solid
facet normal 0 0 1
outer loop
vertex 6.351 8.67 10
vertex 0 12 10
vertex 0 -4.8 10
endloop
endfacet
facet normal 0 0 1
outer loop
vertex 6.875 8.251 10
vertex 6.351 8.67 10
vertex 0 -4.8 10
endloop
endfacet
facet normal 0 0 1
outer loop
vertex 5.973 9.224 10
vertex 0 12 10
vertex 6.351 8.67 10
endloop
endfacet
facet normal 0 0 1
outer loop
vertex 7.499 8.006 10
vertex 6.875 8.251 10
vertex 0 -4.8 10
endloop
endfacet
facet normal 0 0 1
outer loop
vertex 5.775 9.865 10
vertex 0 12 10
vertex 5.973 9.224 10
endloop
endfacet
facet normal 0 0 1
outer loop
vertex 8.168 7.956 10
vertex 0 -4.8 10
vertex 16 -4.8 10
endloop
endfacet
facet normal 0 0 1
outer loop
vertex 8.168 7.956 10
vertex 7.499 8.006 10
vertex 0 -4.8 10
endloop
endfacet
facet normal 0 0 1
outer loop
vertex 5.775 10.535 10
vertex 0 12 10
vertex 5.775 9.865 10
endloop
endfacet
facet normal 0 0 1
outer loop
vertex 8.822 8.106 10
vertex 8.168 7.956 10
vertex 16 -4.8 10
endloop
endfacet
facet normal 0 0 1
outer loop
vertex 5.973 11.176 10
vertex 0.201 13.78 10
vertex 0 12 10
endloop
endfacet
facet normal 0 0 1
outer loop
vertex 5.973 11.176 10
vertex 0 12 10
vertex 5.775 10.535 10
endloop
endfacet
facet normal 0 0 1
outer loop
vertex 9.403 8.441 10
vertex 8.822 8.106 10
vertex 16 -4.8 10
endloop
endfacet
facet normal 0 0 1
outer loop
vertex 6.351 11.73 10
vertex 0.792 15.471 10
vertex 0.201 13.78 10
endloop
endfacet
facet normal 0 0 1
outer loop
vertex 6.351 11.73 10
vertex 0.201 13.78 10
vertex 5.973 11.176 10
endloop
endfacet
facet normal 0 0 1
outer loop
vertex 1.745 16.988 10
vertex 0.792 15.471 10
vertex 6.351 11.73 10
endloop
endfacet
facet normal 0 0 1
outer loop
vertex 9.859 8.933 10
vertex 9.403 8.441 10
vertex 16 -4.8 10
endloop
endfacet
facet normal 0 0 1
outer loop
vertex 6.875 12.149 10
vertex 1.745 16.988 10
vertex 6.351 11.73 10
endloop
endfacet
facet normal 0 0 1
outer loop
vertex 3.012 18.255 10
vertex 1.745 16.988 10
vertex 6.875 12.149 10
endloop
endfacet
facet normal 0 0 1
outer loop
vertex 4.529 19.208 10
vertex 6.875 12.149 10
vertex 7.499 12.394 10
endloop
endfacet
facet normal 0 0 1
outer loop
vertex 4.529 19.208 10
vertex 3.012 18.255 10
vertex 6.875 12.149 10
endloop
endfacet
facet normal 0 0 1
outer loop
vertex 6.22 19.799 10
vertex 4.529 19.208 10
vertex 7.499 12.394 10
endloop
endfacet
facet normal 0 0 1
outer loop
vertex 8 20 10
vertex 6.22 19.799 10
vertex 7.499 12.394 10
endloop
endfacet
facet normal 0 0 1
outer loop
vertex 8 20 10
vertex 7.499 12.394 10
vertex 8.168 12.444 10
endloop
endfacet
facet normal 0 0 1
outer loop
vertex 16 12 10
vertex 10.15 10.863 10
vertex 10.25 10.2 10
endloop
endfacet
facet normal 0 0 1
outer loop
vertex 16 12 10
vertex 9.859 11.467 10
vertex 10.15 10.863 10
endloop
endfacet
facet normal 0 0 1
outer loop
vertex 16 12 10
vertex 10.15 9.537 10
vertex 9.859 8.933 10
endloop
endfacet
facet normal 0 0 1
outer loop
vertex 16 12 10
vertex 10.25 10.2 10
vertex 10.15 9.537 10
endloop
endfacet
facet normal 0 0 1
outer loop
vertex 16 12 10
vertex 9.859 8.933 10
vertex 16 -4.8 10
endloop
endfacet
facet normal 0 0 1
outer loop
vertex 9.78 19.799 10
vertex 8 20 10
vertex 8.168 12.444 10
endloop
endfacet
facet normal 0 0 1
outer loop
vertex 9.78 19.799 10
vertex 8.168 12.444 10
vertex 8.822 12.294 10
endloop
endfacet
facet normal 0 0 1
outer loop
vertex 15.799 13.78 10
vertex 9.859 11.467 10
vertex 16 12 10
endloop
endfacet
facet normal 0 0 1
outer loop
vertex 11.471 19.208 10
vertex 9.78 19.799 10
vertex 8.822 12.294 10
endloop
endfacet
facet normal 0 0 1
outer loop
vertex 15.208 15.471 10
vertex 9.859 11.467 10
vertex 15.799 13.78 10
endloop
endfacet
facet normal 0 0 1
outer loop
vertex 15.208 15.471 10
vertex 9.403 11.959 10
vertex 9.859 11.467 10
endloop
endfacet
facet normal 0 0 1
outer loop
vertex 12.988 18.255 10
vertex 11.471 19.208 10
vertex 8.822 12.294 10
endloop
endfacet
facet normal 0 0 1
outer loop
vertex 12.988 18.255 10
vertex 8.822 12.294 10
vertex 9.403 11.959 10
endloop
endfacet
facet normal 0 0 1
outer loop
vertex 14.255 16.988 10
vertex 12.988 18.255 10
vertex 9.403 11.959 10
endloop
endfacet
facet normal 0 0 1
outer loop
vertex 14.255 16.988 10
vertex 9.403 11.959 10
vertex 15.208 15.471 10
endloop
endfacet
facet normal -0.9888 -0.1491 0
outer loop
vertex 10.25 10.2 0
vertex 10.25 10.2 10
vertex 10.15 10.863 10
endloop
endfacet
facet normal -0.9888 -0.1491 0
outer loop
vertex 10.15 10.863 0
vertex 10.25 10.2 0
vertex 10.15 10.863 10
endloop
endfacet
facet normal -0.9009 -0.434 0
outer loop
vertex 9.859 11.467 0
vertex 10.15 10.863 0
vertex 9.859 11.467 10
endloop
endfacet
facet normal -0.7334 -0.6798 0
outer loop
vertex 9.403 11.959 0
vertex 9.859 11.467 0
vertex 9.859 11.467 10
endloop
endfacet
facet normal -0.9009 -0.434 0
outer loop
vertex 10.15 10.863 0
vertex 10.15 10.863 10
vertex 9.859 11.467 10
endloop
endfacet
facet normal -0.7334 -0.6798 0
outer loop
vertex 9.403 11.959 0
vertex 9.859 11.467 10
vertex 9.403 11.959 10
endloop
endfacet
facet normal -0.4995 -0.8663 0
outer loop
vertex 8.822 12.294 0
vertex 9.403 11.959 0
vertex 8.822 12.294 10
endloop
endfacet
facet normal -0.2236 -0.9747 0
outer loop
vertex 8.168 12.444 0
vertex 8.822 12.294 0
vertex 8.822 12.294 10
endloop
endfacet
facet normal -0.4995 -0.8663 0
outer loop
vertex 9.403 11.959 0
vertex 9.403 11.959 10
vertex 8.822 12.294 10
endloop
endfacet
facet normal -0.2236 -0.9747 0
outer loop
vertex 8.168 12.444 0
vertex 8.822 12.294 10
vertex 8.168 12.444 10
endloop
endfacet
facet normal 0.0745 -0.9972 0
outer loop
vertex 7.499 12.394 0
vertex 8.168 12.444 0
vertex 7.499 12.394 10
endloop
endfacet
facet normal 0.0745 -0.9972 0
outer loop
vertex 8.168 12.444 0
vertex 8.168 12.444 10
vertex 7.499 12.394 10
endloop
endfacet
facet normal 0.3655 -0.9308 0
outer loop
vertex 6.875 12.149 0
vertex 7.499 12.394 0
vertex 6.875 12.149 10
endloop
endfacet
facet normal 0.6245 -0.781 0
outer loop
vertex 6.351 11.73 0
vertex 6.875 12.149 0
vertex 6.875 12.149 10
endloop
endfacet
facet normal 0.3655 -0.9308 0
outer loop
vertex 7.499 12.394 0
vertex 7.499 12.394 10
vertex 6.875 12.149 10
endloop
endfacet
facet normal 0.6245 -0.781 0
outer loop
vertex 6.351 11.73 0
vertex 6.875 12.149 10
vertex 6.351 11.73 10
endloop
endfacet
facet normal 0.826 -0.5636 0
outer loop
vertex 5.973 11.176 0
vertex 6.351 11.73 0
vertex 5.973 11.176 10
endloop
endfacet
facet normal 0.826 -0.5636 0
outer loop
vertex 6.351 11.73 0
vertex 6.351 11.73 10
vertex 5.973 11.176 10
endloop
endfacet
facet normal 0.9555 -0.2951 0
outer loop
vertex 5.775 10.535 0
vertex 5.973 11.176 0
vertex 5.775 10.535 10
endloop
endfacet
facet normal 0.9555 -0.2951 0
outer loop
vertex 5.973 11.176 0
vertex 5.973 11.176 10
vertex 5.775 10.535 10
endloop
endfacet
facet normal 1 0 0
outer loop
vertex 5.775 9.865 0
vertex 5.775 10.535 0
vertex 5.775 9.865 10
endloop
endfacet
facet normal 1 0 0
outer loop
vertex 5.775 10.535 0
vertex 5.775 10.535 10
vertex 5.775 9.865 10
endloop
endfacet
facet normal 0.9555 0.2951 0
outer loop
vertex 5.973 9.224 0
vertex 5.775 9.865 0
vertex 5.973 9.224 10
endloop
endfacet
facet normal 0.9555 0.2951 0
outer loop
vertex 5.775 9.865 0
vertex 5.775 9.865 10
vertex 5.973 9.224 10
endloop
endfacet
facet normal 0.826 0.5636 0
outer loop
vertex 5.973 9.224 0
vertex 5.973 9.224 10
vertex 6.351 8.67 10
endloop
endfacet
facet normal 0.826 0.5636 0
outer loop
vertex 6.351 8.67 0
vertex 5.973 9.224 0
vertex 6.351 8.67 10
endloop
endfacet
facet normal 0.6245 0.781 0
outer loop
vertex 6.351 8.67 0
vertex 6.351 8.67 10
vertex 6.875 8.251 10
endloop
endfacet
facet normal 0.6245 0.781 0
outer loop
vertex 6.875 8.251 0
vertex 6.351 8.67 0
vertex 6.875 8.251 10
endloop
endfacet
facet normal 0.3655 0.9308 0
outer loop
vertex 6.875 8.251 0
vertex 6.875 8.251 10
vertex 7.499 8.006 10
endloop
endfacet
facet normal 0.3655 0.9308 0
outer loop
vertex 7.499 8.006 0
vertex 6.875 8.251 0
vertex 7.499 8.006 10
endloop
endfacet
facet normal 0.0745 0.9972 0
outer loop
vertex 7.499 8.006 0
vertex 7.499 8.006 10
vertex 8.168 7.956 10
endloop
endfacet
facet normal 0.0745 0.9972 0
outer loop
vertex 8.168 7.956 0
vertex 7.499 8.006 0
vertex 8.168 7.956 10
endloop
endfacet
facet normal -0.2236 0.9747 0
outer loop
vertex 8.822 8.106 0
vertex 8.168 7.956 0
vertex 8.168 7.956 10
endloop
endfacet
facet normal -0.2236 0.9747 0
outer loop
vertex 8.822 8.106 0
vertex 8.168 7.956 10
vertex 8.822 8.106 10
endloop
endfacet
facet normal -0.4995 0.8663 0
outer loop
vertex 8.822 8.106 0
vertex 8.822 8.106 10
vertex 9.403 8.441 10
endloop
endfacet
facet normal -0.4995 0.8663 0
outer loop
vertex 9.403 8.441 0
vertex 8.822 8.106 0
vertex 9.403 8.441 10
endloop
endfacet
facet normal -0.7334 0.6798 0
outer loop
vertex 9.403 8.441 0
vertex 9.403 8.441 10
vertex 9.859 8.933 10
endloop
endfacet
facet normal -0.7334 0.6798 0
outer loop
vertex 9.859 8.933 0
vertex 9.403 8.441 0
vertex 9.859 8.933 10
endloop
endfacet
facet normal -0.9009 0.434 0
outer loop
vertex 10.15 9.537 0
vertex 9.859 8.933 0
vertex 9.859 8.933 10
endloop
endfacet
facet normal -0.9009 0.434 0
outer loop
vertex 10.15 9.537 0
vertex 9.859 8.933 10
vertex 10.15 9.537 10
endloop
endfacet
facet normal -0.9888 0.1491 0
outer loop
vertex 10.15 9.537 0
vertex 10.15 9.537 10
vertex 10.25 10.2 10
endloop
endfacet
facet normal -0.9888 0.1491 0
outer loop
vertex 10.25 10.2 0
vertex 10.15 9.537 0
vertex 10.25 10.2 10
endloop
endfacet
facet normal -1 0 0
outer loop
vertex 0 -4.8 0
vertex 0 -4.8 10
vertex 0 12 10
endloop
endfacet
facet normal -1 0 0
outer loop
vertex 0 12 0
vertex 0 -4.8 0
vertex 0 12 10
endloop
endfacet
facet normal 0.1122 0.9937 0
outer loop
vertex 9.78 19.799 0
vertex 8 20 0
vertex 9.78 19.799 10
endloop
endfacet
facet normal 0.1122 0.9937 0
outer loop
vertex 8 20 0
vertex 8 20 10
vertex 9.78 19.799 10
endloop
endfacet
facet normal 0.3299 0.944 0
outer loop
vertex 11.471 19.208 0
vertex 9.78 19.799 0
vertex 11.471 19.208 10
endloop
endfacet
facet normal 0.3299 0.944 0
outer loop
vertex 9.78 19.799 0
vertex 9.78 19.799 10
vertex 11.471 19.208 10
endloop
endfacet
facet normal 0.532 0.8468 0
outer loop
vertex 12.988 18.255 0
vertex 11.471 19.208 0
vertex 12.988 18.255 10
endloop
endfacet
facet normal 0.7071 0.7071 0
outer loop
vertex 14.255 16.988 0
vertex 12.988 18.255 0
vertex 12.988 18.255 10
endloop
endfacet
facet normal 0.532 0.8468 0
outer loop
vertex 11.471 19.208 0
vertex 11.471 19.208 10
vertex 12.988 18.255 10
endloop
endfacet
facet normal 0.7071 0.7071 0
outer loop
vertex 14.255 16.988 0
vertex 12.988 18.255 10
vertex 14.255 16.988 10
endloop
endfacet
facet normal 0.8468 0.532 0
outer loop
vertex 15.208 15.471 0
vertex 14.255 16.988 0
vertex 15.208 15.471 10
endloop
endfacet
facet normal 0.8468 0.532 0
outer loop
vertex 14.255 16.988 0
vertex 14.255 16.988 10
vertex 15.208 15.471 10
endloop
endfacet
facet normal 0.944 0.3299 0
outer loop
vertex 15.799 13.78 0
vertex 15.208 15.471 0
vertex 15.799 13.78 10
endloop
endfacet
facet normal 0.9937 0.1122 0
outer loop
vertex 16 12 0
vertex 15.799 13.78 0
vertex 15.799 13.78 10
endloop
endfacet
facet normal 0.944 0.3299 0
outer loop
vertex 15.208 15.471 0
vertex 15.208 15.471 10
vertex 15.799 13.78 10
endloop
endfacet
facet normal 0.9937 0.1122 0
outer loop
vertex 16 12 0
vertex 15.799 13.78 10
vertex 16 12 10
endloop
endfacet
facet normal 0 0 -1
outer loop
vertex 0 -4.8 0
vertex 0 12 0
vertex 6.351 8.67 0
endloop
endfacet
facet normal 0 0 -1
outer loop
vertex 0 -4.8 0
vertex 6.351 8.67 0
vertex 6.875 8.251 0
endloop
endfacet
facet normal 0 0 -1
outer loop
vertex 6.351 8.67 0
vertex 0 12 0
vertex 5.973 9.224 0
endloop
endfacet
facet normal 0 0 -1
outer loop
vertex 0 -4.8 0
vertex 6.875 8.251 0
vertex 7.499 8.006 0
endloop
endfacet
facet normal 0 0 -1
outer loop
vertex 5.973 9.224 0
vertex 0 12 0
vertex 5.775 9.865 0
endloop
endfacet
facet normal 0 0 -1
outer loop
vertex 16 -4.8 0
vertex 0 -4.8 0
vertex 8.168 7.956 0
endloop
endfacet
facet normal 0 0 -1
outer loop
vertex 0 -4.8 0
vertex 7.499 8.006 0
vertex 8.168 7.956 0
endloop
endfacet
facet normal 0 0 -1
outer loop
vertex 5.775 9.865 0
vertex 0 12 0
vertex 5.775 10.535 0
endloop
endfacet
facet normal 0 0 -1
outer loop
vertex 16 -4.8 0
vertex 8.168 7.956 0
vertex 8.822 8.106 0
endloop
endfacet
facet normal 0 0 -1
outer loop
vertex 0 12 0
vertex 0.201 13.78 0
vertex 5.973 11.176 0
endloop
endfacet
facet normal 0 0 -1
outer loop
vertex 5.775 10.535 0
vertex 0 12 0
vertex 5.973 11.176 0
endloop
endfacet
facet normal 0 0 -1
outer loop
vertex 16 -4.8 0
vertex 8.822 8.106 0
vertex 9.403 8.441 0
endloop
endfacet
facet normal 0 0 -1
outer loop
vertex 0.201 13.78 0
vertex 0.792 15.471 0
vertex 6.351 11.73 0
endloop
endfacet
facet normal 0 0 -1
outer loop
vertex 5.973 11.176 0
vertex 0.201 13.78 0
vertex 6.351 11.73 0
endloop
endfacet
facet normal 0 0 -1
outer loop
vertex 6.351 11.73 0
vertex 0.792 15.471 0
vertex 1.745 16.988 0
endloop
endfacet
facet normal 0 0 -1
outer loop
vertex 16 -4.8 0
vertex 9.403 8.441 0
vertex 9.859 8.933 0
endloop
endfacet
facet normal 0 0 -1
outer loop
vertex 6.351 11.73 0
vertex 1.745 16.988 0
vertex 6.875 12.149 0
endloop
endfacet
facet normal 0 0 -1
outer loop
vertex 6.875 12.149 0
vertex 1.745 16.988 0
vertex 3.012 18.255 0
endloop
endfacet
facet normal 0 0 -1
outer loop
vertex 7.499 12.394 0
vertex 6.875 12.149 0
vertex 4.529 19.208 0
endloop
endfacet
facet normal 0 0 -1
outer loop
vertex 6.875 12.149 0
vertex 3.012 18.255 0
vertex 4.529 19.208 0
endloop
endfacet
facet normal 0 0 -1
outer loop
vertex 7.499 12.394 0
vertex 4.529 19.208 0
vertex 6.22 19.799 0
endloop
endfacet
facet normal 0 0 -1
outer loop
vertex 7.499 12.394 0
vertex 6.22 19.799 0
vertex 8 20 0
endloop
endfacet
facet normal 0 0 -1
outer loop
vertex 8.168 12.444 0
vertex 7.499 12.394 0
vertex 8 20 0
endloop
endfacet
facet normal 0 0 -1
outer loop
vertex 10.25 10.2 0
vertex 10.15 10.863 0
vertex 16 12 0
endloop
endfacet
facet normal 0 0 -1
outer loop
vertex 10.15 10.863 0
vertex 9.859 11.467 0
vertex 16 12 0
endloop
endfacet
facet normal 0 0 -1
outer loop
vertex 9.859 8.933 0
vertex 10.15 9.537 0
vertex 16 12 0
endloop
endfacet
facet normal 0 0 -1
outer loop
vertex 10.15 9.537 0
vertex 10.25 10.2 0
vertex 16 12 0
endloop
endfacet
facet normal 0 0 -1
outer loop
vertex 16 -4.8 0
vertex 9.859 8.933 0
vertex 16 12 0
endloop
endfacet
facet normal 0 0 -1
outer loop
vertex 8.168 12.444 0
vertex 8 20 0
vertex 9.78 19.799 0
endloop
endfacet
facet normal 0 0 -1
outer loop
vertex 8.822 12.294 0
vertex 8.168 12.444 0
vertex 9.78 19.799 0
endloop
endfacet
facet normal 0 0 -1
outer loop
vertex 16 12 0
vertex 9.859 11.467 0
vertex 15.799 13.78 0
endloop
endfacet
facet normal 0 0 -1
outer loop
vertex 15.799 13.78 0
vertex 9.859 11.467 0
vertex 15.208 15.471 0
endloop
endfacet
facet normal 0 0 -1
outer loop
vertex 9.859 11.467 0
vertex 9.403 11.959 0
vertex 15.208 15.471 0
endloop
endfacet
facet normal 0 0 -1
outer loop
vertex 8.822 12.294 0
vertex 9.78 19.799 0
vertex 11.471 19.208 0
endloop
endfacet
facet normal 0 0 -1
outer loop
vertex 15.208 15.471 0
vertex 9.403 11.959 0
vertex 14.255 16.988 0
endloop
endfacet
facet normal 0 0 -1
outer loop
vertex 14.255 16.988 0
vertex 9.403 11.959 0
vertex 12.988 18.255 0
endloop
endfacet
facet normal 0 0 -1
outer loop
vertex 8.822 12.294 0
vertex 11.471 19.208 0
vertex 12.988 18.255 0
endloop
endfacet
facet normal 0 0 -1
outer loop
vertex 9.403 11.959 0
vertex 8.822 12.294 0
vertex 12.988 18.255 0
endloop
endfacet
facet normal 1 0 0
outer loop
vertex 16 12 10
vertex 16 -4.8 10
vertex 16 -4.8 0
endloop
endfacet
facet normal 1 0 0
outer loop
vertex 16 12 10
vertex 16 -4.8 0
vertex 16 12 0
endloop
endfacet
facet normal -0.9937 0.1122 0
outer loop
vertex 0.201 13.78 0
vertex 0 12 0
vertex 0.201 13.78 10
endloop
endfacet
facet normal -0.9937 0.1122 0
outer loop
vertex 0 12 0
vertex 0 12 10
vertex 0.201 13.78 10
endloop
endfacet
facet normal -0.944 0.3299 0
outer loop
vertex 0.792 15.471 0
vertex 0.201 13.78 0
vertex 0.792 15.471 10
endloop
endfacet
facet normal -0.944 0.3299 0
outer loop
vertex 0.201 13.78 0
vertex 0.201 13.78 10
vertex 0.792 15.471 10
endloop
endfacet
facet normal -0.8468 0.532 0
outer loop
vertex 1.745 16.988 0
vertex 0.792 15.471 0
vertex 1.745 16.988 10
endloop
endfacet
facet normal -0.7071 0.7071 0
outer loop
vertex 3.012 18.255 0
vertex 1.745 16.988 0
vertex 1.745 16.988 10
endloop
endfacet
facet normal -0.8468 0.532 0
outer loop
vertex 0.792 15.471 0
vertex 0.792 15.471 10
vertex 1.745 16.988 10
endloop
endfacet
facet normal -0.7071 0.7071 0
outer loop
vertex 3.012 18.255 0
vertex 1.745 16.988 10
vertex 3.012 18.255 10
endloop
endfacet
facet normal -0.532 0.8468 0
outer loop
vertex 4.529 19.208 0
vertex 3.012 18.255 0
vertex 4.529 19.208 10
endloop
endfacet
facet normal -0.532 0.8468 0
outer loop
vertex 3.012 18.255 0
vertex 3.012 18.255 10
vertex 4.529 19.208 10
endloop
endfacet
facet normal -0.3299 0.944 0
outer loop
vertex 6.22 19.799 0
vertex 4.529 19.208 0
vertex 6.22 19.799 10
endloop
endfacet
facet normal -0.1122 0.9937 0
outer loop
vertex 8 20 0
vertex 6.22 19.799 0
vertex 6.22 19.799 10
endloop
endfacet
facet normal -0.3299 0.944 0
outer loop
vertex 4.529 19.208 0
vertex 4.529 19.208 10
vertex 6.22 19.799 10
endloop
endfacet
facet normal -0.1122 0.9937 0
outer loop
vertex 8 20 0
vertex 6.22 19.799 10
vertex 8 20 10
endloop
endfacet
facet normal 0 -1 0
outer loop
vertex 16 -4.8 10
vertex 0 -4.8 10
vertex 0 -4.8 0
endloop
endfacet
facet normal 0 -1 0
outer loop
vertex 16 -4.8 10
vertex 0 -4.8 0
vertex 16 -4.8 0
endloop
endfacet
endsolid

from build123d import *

# Parameters (mm, degrees)
SKETCH1_W           = 16
SKETCH1_H           = 20
BOSS_EXTRUDE1_DEPTH = 10
SKETCH2_R           = 2.25
CUT_EXTRUDE1_DEPTH  = 28.49545417
FILLET1_R           = 8
SKETCH3_W           = 16
SKETCH3_H           = 4.8
BOSS_EXTRUDE2_DEPTH = 10


with BuildPart() as part:
    # Sketch1 → Boss-Extrude1 (new body)
    with BuildSketch(Plane.XY):
        with Locations((8, 10)):
            Rectangle(SKETCH1_W, SKETCH1_H)
    extrude(amount=BOSS_EXTRUDE1_DEPTH)

    # Sketch2 → Cut-Extrude1 (cut, through all)
    with BuildSketch(Plane.XY.offset(10)):
        with Locations((8, 10.2)):
            Circle(SKETCH2_R)
    extrude(amount=-CUT_EXTRUDE1_DEPTH, mode=Mode.SUBTRACT)

    # Fillet1
    fillet1_edges = [part.edges().sort_by_distance(p)[0] for p in [
        (16, 20, 5),
        (0, 20, 5),
    ]]
    fillet(fillet1_edges, radius=FILLET1_R - 0.0001)  # a hair under: the kernel refuses the full size

    # Sketch3 → Boss-Extrude2 (add)
    with BuildSketch(Plane.XY.offset(10)):
        with Locations((8, -2.4)):
            Rectangle(SKETCH3_W, SKETCH3_H)
    extrude(amount=-BOSS_EXTRUDE2_DEPTH)


solid = part.part
